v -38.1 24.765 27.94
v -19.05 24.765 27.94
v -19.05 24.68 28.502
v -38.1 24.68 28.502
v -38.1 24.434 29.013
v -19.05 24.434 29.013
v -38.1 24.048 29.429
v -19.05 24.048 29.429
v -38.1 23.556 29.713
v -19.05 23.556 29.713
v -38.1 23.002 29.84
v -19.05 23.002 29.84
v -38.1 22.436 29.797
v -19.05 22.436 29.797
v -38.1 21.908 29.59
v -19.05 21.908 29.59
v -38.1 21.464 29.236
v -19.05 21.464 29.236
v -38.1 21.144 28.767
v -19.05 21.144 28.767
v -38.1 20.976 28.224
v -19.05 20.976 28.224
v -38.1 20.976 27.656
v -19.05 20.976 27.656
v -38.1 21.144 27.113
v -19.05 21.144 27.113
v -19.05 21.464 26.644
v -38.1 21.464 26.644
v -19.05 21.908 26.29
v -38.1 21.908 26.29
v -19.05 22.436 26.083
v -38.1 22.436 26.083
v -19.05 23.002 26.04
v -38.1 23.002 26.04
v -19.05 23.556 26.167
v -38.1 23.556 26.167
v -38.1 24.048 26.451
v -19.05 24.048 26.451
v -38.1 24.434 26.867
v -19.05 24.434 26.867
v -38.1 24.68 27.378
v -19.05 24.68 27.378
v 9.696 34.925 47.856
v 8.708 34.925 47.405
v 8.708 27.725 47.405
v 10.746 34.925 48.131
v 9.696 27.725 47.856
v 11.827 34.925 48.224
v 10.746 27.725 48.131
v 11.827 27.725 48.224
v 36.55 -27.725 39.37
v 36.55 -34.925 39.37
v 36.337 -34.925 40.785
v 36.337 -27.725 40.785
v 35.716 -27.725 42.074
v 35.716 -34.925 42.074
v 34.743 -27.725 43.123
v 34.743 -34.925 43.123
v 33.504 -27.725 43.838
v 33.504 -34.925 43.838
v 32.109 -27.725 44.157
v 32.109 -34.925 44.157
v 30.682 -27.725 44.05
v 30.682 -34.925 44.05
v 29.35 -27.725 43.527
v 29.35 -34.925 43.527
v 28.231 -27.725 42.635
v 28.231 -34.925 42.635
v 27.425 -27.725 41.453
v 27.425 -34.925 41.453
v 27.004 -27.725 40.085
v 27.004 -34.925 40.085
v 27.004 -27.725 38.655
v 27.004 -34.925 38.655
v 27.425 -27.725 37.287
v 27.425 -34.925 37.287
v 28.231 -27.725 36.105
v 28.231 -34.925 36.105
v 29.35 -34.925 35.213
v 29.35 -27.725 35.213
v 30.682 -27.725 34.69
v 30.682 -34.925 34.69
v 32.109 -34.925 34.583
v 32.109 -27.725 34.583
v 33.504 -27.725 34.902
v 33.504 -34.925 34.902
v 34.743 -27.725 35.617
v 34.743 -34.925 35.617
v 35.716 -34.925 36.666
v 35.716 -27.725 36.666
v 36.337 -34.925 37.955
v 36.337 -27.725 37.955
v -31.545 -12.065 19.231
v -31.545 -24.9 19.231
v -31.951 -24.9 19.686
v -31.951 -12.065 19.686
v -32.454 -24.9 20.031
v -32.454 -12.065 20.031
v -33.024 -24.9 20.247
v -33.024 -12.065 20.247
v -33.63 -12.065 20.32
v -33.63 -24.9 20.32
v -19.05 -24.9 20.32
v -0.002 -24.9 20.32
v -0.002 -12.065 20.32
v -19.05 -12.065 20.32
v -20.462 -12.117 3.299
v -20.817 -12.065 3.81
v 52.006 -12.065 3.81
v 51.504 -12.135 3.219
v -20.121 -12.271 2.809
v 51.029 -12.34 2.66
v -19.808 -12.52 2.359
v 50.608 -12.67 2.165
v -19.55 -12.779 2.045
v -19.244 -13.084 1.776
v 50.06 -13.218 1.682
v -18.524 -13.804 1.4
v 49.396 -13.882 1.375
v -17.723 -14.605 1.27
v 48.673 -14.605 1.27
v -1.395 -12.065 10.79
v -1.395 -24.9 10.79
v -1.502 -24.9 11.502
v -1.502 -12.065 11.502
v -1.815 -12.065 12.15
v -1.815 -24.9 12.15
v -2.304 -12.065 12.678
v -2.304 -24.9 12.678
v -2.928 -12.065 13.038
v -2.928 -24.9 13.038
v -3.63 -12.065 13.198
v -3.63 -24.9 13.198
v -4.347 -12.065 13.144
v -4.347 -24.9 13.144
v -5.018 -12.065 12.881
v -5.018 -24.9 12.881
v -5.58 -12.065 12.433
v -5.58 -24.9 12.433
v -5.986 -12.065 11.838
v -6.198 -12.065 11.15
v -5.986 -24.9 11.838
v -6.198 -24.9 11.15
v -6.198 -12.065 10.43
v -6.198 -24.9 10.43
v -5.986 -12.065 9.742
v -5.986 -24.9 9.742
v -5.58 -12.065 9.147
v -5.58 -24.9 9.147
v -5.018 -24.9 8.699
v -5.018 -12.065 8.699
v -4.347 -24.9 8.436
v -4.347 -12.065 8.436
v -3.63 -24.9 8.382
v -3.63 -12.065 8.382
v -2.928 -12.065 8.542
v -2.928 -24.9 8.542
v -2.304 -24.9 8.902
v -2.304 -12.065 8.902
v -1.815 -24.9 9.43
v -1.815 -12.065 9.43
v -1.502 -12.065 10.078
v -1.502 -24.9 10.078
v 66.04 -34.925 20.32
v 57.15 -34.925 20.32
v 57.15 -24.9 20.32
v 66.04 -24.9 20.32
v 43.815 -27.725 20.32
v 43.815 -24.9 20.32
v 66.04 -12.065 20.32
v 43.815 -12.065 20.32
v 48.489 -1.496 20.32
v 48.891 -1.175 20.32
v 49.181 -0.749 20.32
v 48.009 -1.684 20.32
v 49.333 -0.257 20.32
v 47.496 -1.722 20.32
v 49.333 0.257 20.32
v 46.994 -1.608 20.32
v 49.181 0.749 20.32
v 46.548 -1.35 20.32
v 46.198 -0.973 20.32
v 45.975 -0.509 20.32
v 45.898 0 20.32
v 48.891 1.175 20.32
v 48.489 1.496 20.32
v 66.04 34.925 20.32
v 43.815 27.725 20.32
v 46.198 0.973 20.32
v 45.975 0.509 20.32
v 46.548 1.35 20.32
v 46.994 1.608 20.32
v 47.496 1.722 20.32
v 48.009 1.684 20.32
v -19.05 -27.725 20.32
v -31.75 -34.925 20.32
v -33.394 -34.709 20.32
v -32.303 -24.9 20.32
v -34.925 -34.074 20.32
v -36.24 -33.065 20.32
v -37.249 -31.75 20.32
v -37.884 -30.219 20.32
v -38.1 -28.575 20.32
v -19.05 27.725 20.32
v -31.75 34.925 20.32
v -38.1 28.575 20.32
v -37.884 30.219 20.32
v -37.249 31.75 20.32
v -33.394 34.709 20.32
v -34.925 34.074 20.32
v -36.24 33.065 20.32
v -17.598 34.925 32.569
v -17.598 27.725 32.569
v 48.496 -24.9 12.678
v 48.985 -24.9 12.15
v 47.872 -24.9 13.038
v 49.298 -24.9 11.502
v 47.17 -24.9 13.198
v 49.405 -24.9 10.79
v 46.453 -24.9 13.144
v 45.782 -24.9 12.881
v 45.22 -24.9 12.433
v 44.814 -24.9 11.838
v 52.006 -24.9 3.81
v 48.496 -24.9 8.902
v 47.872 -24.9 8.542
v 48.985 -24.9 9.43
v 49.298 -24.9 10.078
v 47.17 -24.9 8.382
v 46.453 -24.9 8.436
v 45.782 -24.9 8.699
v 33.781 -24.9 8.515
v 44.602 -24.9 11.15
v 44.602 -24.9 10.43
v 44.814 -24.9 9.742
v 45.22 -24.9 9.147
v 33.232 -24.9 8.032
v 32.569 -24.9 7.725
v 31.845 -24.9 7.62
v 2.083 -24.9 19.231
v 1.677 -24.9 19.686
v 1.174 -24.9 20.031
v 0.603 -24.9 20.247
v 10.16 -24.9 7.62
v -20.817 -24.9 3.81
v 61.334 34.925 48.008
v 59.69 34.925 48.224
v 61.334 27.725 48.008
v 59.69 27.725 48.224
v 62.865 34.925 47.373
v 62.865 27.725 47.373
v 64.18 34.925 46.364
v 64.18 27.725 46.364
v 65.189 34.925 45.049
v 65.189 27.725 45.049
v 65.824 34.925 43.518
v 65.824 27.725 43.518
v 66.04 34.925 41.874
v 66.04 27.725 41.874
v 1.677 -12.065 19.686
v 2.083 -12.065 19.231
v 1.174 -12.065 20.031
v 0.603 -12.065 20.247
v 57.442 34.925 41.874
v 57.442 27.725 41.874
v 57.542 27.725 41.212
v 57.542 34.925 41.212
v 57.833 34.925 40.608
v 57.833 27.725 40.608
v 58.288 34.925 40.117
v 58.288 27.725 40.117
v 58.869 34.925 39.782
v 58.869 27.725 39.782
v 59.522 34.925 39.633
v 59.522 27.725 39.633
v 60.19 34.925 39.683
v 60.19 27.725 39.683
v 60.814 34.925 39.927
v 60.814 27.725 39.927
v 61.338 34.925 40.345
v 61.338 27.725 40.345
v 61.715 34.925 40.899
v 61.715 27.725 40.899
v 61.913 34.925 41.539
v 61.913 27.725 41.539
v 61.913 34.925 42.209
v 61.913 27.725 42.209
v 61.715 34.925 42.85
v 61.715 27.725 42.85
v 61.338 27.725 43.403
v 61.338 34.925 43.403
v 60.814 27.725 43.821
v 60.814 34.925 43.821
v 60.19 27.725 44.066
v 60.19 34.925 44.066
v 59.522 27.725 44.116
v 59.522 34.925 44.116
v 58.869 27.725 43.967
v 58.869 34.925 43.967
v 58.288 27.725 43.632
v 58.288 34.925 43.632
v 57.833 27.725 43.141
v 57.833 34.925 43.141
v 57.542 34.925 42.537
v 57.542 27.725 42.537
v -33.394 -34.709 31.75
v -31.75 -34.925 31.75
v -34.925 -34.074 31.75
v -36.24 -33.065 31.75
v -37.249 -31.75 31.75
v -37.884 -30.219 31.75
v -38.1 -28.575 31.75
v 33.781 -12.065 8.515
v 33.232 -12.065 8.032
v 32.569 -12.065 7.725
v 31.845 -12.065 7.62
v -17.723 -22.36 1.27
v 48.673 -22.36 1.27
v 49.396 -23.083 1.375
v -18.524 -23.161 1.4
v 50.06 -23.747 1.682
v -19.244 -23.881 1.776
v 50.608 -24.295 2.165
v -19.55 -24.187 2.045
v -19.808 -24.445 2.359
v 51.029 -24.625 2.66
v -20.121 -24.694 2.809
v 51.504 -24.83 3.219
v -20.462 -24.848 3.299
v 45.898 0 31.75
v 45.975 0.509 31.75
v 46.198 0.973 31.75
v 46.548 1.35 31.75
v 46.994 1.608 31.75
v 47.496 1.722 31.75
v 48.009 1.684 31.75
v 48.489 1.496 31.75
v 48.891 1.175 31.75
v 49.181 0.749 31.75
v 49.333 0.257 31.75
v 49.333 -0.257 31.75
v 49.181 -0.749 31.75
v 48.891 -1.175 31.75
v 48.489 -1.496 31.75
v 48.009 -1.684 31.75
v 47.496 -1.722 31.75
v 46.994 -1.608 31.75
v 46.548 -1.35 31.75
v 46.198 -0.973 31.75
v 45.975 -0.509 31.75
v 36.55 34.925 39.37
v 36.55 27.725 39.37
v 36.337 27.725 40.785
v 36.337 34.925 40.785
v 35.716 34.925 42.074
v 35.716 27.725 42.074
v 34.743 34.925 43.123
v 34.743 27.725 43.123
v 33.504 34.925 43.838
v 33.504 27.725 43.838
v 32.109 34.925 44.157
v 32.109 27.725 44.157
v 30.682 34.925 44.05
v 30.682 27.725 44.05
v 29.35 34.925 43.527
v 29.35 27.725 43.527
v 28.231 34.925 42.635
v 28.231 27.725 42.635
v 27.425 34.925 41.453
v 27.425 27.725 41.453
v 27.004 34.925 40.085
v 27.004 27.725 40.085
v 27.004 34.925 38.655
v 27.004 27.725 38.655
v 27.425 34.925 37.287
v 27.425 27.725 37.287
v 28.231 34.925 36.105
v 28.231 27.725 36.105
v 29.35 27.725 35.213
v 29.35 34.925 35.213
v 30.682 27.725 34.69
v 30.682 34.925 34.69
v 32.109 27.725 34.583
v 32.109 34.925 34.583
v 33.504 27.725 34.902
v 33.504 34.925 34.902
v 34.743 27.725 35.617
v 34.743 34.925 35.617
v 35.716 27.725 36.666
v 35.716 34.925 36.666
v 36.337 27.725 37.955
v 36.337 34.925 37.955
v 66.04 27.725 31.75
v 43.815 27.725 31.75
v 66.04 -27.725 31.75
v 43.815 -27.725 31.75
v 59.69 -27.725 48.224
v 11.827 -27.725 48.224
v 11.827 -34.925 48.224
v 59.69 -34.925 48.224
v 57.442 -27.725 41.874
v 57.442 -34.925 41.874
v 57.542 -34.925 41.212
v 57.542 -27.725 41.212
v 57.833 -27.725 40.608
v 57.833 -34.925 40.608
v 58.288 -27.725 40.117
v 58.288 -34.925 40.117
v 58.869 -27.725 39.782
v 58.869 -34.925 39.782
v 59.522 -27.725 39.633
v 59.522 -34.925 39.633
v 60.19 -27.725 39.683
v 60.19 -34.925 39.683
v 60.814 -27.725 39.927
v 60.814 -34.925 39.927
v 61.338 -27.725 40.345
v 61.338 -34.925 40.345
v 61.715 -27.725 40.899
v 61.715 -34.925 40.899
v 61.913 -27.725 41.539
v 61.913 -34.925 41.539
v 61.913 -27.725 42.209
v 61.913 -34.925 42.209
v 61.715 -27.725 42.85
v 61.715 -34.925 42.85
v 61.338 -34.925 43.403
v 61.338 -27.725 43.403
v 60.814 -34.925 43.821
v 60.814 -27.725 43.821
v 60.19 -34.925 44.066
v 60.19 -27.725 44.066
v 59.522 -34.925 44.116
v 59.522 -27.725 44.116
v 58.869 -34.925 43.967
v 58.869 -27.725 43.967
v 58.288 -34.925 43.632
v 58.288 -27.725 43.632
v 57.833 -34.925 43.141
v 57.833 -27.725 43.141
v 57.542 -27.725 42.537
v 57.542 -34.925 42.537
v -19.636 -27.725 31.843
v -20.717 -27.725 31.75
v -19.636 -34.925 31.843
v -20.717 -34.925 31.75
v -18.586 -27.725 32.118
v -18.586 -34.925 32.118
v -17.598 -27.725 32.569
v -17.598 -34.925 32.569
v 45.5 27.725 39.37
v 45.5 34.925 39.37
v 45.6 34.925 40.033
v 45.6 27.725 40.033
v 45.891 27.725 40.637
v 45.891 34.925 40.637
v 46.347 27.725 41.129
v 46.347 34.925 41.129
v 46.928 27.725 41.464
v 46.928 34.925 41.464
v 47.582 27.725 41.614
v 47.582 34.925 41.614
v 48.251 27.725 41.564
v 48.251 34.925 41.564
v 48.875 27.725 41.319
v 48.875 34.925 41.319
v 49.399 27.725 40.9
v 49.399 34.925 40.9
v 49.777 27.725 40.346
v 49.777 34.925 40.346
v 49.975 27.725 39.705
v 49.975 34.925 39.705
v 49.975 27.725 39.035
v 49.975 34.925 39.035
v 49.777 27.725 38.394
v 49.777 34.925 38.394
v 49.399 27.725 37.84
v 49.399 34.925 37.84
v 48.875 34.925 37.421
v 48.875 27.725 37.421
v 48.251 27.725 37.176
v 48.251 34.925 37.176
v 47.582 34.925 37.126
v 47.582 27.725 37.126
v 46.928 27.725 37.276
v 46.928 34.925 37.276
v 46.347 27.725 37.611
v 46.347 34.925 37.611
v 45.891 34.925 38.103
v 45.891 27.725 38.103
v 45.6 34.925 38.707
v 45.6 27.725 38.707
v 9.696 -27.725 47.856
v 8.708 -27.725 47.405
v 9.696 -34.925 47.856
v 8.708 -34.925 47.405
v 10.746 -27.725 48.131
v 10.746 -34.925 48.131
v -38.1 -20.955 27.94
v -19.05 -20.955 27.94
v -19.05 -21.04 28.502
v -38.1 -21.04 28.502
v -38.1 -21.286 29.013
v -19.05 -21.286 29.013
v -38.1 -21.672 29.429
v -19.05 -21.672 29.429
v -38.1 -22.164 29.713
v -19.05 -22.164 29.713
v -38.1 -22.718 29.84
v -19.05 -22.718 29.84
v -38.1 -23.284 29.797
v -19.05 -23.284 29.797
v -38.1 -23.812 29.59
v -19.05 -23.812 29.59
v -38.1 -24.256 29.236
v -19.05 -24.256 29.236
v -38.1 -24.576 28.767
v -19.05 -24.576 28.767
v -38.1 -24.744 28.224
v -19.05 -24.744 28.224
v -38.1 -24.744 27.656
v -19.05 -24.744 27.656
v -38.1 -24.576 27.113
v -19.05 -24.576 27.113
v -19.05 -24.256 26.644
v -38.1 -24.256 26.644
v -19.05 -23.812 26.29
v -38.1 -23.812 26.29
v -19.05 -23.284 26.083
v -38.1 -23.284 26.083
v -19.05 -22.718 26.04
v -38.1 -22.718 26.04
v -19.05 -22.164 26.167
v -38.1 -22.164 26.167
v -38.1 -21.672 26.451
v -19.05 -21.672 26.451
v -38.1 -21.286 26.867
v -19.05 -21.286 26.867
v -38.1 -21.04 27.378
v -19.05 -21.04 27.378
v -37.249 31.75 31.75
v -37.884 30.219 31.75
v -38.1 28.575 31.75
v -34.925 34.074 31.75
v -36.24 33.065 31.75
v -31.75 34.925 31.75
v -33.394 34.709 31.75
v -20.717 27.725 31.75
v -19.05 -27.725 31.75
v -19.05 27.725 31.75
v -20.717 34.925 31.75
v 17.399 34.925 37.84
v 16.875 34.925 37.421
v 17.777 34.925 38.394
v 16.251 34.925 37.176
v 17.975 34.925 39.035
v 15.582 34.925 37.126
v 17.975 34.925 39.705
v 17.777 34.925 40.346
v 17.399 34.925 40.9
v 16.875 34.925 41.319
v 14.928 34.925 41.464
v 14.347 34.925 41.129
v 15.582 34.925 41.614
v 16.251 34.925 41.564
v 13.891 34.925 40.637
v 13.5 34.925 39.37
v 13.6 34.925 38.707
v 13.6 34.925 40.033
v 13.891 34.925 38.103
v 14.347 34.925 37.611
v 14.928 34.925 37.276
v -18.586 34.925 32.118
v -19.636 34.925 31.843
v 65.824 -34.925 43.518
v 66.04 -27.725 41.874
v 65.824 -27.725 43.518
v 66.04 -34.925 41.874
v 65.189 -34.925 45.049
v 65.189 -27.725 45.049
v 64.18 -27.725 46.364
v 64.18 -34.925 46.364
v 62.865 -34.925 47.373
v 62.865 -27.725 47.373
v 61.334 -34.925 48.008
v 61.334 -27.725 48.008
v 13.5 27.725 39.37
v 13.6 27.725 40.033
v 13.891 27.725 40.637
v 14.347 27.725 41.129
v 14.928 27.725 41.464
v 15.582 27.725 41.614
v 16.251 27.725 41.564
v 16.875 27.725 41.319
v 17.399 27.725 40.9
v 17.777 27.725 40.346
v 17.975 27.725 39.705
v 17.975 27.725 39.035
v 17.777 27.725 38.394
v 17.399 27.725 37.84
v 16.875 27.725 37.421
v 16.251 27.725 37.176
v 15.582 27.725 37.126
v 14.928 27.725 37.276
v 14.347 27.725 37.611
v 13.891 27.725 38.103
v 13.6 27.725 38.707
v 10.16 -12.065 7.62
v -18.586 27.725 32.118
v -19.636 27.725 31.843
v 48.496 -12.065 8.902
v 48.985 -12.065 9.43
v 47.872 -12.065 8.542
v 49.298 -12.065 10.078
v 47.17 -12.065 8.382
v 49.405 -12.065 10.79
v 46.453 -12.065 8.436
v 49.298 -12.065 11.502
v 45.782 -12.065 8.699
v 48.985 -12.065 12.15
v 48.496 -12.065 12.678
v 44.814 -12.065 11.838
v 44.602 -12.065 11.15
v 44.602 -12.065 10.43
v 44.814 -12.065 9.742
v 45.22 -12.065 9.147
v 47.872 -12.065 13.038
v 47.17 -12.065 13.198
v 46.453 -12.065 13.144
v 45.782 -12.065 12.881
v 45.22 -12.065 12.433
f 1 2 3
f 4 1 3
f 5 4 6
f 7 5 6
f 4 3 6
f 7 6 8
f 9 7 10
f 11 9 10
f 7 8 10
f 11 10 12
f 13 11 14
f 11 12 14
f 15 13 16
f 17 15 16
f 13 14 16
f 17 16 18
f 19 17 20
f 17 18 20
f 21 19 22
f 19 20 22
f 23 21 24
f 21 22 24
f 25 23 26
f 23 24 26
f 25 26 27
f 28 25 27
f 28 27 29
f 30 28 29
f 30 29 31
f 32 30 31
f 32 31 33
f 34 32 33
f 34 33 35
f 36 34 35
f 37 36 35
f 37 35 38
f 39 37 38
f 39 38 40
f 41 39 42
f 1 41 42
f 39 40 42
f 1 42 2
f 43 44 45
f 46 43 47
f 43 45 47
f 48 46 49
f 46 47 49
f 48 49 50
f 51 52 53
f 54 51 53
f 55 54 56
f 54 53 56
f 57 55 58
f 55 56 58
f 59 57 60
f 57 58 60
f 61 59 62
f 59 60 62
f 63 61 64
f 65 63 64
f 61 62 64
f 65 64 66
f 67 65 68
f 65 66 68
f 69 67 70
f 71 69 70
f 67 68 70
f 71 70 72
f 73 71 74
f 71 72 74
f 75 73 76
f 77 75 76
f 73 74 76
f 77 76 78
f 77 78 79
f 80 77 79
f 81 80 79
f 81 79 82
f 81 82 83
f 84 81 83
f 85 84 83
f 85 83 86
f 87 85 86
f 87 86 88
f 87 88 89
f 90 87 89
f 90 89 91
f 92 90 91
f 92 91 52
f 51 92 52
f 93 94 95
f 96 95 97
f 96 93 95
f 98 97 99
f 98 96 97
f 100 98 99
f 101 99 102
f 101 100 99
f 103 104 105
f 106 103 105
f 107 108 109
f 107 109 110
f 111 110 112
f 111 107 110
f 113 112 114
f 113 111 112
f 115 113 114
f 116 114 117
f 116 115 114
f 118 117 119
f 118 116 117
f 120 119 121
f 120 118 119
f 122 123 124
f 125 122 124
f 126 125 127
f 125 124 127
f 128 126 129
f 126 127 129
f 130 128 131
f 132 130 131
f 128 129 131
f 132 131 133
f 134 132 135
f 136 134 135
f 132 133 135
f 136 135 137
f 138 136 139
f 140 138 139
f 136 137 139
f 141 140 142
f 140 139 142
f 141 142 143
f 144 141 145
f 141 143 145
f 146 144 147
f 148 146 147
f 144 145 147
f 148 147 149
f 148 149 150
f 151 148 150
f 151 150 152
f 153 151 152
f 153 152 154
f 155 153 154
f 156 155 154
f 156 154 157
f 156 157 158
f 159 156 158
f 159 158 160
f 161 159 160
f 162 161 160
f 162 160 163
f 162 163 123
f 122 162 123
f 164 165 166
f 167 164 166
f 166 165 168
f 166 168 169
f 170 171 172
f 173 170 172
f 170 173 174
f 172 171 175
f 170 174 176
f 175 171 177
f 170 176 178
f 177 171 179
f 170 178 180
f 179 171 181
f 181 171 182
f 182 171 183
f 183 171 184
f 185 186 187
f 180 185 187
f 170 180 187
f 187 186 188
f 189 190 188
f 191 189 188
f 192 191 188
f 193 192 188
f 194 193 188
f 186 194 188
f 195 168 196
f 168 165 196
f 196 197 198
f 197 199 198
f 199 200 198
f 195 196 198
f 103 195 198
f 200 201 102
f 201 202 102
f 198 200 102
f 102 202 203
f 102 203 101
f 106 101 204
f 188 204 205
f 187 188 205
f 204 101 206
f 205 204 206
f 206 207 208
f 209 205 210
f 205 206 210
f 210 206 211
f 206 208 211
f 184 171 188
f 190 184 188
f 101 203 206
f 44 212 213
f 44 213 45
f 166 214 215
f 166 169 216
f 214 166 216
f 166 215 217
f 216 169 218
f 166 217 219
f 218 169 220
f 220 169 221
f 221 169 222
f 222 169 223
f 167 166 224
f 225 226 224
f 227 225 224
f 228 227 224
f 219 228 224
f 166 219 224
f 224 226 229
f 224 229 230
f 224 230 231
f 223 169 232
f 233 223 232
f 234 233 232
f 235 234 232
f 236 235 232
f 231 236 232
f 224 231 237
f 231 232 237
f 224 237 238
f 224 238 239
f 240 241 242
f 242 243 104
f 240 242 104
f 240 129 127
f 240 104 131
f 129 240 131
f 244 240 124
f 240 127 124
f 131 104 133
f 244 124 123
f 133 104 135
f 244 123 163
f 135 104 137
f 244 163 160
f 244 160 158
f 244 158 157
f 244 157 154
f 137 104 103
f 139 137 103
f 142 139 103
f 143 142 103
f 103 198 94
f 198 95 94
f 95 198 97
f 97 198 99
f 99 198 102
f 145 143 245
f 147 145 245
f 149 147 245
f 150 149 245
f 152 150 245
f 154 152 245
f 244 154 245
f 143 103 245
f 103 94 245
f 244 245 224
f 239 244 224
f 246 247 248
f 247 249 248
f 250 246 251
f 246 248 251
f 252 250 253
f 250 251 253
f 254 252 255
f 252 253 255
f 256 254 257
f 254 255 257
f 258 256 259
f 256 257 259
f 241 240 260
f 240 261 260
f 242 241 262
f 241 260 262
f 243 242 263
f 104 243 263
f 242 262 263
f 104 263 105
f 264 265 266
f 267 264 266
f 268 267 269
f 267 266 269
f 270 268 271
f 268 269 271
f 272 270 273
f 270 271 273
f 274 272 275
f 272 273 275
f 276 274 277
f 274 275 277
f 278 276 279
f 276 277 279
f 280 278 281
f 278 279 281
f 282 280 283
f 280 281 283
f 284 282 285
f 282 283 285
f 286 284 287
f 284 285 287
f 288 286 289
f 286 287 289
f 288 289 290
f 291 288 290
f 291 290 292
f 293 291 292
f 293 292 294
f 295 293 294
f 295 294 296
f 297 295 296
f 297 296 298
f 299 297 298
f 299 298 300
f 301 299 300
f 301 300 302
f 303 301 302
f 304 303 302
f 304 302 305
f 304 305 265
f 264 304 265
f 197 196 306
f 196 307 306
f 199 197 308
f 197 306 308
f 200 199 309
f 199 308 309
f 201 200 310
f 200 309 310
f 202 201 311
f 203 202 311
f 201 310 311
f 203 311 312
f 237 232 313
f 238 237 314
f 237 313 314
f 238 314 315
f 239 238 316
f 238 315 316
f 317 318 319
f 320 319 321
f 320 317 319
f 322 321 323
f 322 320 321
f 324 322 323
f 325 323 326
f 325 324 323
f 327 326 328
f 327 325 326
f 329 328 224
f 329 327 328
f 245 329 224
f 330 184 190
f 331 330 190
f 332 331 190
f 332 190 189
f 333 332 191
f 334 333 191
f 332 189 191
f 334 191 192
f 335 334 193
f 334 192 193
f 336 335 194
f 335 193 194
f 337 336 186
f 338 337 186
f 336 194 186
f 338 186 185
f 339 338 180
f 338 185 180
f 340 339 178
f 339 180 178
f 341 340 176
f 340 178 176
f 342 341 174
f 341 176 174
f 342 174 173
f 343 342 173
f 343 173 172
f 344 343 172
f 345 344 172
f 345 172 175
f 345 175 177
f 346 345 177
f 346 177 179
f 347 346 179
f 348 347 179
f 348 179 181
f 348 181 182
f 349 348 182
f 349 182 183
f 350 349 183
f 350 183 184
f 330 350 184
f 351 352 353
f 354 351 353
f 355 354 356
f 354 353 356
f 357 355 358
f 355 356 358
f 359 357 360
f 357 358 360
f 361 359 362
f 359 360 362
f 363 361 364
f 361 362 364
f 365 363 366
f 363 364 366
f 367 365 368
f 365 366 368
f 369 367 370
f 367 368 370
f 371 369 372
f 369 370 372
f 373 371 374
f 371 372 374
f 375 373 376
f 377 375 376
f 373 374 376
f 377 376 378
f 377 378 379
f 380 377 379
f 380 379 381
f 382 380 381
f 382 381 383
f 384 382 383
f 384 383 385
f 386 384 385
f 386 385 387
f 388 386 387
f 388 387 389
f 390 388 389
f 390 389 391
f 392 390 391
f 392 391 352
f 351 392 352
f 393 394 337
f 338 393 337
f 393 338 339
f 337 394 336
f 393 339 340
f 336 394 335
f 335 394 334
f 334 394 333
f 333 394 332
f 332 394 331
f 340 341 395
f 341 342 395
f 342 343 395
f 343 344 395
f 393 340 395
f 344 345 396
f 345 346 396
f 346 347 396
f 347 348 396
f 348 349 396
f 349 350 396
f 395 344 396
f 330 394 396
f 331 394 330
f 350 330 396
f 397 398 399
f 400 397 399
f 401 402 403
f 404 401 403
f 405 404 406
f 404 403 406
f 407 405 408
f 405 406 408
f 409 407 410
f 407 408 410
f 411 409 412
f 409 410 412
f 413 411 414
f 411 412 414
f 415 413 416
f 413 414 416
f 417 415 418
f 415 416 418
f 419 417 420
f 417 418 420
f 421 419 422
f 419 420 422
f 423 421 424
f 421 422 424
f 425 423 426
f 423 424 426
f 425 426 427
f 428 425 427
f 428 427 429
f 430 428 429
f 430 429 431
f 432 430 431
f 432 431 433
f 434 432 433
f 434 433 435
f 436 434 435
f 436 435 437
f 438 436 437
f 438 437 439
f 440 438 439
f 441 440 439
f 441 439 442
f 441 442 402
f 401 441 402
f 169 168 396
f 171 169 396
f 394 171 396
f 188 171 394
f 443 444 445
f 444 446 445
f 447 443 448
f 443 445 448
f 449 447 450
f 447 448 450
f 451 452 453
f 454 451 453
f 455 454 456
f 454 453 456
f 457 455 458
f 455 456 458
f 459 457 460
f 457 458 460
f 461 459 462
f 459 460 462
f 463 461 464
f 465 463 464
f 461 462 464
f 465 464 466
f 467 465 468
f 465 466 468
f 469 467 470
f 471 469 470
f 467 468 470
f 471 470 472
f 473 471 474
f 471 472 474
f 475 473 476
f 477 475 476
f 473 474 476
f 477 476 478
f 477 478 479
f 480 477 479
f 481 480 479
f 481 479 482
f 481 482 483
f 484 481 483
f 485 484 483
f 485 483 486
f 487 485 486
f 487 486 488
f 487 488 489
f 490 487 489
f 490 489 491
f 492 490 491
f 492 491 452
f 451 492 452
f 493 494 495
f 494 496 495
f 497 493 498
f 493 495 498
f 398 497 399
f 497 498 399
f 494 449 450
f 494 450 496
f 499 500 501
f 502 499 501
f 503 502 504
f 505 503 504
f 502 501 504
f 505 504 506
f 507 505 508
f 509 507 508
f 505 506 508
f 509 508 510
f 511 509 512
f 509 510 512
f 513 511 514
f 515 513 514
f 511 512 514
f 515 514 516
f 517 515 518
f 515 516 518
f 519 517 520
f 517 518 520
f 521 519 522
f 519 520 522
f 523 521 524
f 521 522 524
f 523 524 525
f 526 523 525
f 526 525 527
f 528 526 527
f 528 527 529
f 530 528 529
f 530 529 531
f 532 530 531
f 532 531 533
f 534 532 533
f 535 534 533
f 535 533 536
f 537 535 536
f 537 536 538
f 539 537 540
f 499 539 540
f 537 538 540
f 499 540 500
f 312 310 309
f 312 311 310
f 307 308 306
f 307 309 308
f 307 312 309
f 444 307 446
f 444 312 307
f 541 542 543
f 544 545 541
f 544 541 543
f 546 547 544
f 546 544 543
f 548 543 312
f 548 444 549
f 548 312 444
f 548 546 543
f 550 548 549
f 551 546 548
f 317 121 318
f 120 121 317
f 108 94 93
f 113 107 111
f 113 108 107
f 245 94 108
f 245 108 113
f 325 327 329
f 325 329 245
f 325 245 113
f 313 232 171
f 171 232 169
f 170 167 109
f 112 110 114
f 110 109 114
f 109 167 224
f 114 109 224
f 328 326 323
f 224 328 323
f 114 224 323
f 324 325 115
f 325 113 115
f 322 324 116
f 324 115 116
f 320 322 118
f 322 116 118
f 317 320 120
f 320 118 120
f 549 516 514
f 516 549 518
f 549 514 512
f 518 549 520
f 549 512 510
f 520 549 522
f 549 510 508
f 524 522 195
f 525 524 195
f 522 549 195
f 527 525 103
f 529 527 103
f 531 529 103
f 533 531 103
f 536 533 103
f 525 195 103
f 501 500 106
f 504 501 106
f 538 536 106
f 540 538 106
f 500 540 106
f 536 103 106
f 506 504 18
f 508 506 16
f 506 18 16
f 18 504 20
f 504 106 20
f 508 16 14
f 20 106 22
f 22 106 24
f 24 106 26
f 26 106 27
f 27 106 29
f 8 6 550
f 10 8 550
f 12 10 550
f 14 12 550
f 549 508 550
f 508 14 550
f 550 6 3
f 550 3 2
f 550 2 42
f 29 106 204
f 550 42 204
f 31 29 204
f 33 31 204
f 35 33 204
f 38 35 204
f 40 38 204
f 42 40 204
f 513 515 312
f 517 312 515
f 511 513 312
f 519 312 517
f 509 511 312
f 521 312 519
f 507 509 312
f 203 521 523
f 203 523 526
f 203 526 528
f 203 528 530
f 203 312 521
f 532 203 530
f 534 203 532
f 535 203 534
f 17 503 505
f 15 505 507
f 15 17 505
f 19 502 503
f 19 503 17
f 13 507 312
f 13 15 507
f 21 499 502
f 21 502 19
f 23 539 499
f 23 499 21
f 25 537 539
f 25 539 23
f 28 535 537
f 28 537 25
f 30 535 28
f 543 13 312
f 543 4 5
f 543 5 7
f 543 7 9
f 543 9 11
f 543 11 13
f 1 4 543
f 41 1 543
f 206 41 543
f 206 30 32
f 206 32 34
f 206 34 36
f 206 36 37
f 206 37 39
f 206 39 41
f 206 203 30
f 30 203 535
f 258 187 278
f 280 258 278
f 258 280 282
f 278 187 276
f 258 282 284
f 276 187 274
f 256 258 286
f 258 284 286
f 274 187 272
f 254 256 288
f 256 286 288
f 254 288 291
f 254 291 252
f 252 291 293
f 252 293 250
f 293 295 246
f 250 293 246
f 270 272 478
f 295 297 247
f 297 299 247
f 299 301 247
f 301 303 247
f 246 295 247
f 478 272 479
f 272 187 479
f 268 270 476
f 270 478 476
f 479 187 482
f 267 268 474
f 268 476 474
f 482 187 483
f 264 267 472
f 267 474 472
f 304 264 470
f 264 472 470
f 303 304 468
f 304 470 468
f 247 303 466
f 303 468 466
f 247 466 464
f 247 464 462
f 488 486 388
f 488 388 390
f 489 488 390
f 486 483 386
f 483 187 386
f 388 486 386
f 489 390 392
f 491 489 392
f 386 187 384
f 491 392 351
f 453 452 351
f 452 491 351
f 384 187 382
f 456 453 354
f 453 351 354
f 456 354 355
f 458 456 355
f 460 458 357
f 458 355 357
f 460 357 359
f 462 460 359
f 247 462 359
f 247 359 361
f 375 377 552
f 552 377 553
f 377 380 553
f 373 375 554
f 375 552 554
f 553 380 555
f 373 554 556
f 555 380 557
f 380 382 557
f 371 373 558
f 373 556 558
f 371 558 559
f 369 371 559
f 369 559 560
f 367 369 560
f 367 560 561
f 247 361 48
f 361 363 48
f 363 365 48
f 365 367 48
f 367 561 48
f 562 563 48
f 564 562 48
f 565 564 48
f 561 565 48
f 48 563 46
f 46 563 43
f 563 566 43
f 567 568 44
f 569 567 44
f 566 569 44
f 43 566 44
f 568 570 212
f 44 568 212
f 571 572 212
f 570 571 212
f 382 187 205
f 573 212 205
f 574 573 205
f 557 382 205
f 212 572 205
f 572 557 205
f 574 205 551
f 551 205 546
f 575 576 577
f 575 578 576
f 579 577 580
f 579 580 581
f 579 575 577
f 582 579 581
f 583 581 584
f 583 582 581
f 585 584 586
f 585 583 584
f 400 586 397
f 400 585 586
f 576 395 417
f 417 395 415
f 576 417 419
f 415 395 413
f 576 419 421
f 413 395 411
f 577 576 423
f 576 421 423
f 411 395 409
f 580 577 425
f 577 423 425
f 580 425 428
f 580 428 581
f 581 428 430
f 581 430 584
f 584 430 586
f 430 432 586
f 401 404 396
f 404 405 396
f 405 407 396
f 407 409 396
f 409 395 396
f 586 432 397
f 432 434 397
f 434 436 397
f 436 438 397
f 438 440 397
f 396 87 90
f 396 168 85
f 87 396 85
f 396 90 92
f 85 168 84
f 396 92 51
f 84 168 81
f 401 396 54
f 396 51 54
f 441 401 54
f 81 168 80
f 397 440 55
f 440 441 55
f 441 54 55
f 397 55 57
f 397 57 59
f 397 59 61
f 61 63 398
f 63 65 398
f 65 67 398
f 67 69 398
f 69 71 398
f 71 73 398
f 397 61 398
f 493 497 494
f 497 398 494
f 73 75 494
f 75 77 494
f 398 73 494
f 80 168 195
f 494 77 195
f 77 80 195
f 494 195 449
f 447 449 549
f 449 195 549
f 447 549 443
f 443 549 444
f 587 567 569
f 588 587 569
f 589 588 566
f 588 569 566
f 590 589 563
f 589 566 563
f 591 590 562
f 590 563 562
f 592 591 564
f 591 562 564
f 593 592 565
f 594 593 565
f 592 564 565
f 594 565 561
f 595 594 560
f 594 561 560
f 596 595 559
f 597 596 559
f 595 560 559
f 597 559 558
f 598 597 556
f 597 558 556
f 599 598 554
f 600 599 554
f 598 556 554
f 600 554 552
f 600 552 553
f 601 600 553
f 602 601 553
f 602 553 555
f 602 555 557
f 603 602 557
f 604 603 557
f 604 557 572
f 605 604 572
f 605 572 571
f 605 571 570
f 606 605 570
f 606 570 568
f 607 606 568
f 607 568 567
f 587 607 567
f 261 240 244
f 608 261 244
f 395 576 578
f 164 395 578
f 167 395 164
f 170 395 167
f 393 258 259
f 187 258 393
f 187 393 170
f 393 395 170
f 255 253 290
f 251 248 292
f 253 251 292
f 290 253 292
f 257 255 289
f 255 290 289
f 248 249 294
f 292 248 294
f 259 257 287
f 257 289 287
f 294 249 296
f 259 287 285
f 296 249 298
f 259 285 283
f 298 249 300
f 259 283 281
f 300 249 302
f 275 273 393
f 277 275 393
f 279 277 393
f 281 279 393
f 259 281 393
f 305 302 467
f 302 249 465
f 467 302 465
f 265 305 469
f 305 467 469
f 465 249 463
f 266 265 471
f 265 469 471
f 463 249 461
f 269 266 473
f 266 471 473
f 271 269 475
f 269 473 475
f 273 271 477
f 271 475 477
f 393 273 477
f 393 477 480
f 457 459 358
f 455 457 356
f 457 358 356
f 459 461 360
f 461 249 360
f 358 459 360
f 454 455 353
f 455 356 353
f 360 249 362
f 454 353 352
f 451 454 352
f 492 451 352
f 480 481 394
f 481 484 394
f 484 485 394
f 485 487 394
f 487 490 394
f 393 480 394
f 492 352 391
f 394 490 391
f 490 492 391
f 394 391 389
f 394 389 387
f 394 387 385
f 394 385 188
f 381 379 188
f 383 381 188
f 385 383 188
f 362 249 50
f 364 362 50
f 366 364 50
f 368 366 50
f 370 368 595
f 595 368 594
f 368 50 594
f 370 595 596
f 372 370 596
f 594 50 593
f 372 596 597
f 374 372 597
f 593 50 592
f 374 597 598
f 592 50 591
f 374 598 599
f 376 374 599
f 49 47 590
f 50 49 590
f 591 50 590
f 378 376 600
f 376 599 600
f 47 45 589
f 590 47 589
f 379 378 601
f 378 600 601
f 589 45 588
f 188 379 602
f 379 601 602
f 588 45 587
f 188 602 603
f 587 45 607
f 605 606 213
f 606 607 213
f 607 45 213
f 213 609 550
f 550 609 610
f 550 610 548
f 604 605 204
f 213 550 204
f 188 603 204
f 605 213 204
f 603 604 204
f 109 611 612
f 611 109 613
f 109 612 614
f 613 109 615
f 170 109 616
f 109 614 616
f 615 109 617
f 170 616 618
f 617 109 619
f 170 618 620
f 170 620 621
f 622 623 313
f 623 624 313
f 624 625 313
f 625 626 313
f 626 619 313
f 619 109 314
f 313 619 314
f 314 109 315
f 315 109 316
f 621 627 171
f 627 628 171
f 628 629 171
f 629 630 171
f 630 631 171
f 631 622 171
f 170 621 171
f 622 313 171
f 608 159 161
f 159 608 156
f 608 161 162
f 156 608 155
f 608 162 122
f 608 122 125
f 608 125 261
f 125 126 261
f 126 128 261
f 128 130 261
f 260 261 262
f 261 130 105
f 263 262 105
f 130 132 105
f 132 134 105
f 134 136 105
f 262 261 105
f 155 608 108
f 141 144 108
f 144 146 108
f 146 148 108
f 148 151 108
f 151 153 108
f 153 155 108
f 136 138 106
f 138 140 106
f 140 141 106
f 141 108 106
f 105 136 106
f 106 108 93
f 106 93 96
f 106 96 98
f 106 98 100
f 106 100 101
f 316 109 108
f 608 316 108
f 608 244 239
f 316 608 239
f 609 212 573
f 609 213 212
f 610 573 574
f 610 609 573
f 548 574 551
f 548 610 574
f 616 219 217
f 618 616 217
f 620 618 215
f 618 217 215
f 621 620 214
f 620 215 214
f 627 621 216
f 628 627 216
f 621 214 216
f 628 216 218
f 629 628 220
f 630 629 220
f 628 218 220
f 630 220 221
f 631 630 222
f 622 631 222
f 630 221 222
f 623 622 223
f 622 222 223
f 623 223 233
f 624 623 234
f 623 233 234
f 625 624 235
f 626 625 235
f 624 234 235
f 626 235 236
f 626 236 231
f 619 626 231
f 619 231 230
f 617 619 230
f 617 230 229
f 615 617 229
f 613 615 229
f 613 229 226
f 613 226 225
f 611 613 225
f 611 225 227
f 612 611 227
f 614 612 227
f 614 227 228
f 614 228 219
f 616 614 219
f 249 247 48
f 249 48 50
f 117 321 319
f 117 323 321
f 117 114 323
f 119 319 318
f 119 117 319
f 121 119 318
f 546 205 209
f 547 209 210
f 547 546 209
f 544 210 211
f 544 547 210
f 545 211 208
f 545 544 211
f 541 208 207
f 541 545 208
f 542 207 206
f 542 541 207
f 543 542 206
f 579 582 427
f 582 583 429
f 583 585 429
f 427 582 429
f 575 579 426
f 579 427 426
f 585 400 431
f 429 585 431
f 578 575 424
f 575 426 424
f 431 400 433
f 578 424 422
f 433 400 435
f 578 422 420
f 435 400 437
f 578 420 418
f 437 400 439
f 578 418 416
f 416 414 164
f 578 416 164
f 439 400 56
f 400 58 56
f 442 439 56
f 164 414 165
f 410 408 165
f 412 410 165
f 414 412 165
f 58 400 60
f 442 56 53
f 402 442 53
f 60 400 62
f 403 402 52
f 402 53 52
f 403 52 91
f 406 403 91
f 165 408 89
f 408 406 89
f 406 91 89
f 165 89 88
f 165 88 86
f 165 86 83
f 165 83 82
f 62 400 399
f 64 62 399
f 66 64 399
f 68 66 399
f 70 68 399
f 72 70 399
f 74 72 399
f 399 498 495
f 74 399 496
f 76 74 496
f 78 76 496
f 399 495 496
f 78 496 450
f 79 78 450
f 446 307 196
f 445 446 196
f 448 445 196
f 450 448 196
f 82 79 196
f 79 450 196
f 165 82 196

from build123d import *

# Parameters (mm, degrees)
SKETCH1_W               = 114.3
SKETCH1_H               = 69.85
BOSS_EXTRUDE1_DEPTH     = 57.15
SKETCH2_W               = 114.3
SKETCH2_H               = 55.450000124
CUT_EXTRUDE2_DEPTH      = 25.4
SKETCH3_W               = 114.3
SKETCH3_H               = 46.99
CUT_EXTRUDE3_DEPTH      = 20.32
CUT_EXTRUDE6_REACH      = 108.824
SKETCH7_R               = 4.8
CUT_EXTRUDE7_DEPTH      = 75.121121315
CUT_EXTRUDE7_DEPTH_BACK = 75.121121315
SKETCH9_W               = 62.865
SKETCH9_H               = 55.450000124
SKETCH9_W_2             = 19.05
SKETCH9_H_2             = 69.85
CUT_EXTRUDE8_REACH      = 108.824
SKETCH8_R               = 2.25
SKETCH12_R              = 1.905
CUT_EXTRUDE10_DEPTH     = 19.05
SKETCH13_W              = 95.25
SKETCH13_H              = 8.925763794
CUT_EXTRUDE12_DEPTH     = 107.823534392
BOSS_EXTRUDE2_REACH     = 103.269
SKETCH14_W              = 20.32
SKETCH14_H              = 15.660000062
SKETCH5_R               = 2.415
CUT_EXTRUDE20_DEPTH     = 103.326545714
SKETCH18_W              = 20.32
SKETCH18_H              = 10.024904341
CUT_EXTRUDE21_DEPTH     = 113.329404355
BOSS_EXTRUDE4_DEPTH     = 8.89
F_8_CLEARANCE_HOLE1_D   = 4.4958
F_8_32_TAPPED_HOLE1_D   = 3.4544
SKETCH40_W              = 104.14
SKETCH40_H              = 12.835095659
CUT_EXTRUDE22_DEPTH     = 1.27
CUT_EXTRUDE24_DEPTH     = 108.544786288
FILLET3_R               = 6.35
CUT_EXTRUDE25_DEPTH     = 102.320780831
FILLET4_R               = 2.54


with BuildPart() as part:
    # Sketch1 → Boss-Extrude1 (new body)
    with BuildSketch(Plane.XY):
        Rectangle(SKETCH1_W, SKETCH1_H)
    extrude(amount=BOSS_EXTRUDE1_DEPTH)

    # Sketch2 → Cut-Extrude2 (cut)
    with BuildSketch(Plane.XY.offset(57.15)):
        Rectangle(SKETCH2_W, SKETCH2_H)
    extrude(amount=-CUT_EXTRUDE2_DEPTH, mode=Mode.SUBTRACT)

    # Sketch3 → Cut-Extrude3 (cut)
    with BuildSketch(Plane(origin=(0, 0, 0), x_dir=(-1, 0, 0), z_dir=(0, 0, -1))):
        with Locations((0, 11.43)):
            Rectangle(SKETCH3_W, SKETCH3_H)
    extrude(amount=-CUT_EXTRUDE3_DEPTH, mode=Mode.SUBTRACT)

    # Cut-Extrude6: up to this face of the body (flat: up to its plane)
    cut_extrude6_end = Plane(part.part.faces().sort_by_distance((0, 34.925, 38.735))[0])
    # Sketch7 → Cut-Extrude6 (cut, up to the picked face)
    with BuildSketch(Plane.XZ.offset(34.925), mode=Mode.PRIVATE) as cut_extrude6_sk1:
        with Locations((31.75, 39.37)):
            Circle(SKETCH7_R)
    cut_extrude6_tool1 = split(extrude(cut_extrude6_sk1.sketch, amount=-CUT_EXTRUDE6_REACH, mode=Mode.PRIVATE), bisect_by=cut_extrude6_end, keep=Keep.BOTH, mode=Mode.PRIVATE)
    add(cut_extrude6_tool1.solids().sort_by(Axis((31.75, -34.925, 39.37), (0, 1, 0)))[0], mode=Mode.SUBTRACT)

    # Sketch9 → Cut-Extrude7 (cut, two sides: drawn at the far end of the back side and taken through both)
    with BuildSketch(Plane.XY.offset(31.75).offset(-CUT_EXTRUDE7_DEPTH_BACK)):
        with Locations((12.3825, 0)):
            Rectangle(SKETCH9_W, SKETCH9_H)
        with Locations((-47.625, 0)):
            Rectangle(SKETCH9_W_2, SKETCH9_H_2)
    extrude(amount=CUT_EXTRUDE7_DEPTH + CUT_EXTRUDE7_DEPTH_BACK, mode=Mode.SUBTRACT)

    # Sketch8 → Cut-Extrude8 (cut, up to next)
    with BuildSketch(Plane(origin=(0, 34.925, 0), x_dir=(1, 0, 0), z_dir=(0, 1, 0)), mode=Mode.PRIVATE) as cut_extrude8_sk1:
        with Locations(Location((15.75, -39.37, 0), (0, 0, 180))):
            Circle(SKETCH8_R)
    cut_extrude8_tool1 = extrude(cut_extrude8_sk1.sketch, amount=-CUT_EXTRUDE8_REACH, mode=Mode.PRIVATE) & part.part
    # Sketch8 → Cut-Extrude8 (cut, up to next)
    with BuildSketch(Plane(origin=(0, 34.925, 0), x_dir=(1, 0, 0), z_dir=(0, 1, 0)), mode=Mode.PRIVATE) as cut_extrude8_sk2:
        with Locations(Location((47.75, -39.37, 0), (0, 0, 180))):
            Circle(SKETCH8_R)
    cut_extrude8_tool2 = extrude(cut_extrude8_sk2.sketch, amount=-CUT_EXTRUDE8_REACH, mode=Mode.PRIVATE) & part.part
    add(cut_extrude8_tool1.solids().sort_by_distance((15.75, 34.925, 39.37))[0], mode=Mode.SUBTRACT)
    add(cut_extrude8_tool2.solids().sort_by_distance((47.75, 34.925, 39.37))[0], mode=Mode.SUBTRACT)

    # Sketch12 → Cut-Extrude10 (cut)
    with BuildSketch(Plane(origin=(-19.05, 0, 0), x_dir=(0, 0, -1), z_dir=(1, 0, 0))):
        with Locations(Location((-27.94, -22.86, 0), (0, 0, 90))):
            Circle(SKETCH12_R)
        with Locations(Location((-27.94, 22.86, 0), (0, 0, 90))):
            Circle(SKETCH12_R)
    extrude(amount=-CUT_EXTRUDE10_DEPTH, mode=Mode.SUBTRACT)

    # Sketch13 → Cut-Extrude12 (cut, through all)
    with BuildSketch(Plane(origin=(0, 34.925, 0), x_dir=(1, 0, 0), z_dir=(0, 1, 0))):
        with Locations((9.525, -52.687118103)):
            Rectangle(SKETCH13_W, SKETCH13_H)
    extrude(amount=-CUT_EXTRUDE12_DEPTH, mode=Mode.SUBTRACT)

    # Sketch14 → Boss-Extrude2 (add, up to next)
    with BuildSketch(Plane.ZY.offset(-43.815), mode=Mode.PRIVATE) as boss_extrude2_sk1:
        with Locations((10.16, -19.895000031)):
            Rectangle(SKETCH14_W, SKETCH14_H)
    boss_extrude2_tool1 = extrude(boss_extrude2_sk1.sketch, amount=BOSS_EXTRUDE2_REACH, mode=Mode.PRIVATE) - part.part
    add(boss_extrude2_tool1.solids().sort_by_distance((43.815, -19.895, 10.16))[0])

    # Sketch5 → Cut-Extrude20 (cut, through all)
    with BuildSketch(Plane.XZ.offset(34.925)):
        with Locations((-3.81, 10.79)):
            Circle(SKETCH5_R)
        with Locations((46.99, 10.79)):
            Circle(SKETCH5_R)
    extrude(amount=-CUT_EXTRUDE20_DEPTH, mode=Mode.SUBTRACT)

    # Sketch18 → Cut-Extrude21 (cut, through all)
    with BuildSketch(Plane.ZY.offset(38.1)):
        with Locations((10.16, -29.91254783)):
            Rectangle(SKETCH18_W, SKETCH18_H)
    extrude(amount=-CUT_EXTRUDE21_DEPTH, mode=Mode.SUBTRACT)

    # Sketch26 → Boss-Extrude4 (add)
    with BuildSketch(Plane(origin=(57.15, 0, 0), x_dir=(0, 0, -1), z_dir=(1, 0, 0))):
        Polygon((-48.224236206, -34.925), (-20.32, -34.925), (-20.32, -24.900095659), (0, -24.900095659), (0, -12.065), (-20.32, -12.065), (-20.32, 34.925), (-48.224236206, 34.925), (-48.224236206, 27.725000062), (-31.75, 27.725000062), (-31.75, -27.725000062), (-48.224236206, -27.725000062), align=None)
    extrude(amount=BOSS_EXTRUDE4_DEPTH)

    # #8 Clearance Hole1 (through all)
    with Locations(Plane(origin=(0, 34.925, 0), x_dir=(1, 0, 0), z_dir=(0, 1, 0))):
        with Locations((59.69, -41.874236206)):
            Hole(F_8_CLEARANCE_HOLE1_D / 2)

    # #8-32 Tapped Hole1 (through all)
    with Locations(Plane.XY.offset(31.75)):
        with Locations((47.625, 0)):
            Hole(F_8_32_TAPPED_HOLE1_D / 2)

    # Sketch40 → Cut-Extrude22 (cut)
    with BuildSketch(Plane(origin=(0, 0, 0), x_dir=(-1, 0, 0), z_dir=(0, 0, -1))):
        with Locations((-13.97, -18.482547829)):
            Rectangle(SKETCH40_W, SKETCH40_H)
    extrude(amount=-CUT_EXTRUDE22_DEPTH, mode=Mode.SUBTRACT)

    # Sketch47 → Cut-Extrude24 (cut, through all)
    with BuildSketch(Plane(origin=(0, 34.925, 0), x_dir=(1, 0, 0), z_dir=(0, 1, 0))):
        Polygon((-38.1, -31.75), (-19.05, -31.75), (10.16, -48.224236206), (-38.1, -48.224236206), align=None)
    extrude(amount=-CUT_EXTRUDE24_DEPTH, mode=Mode.SUBTRACT)

    # Fillet3
    fillet3_edges = [part.edges().sort_by_distance(p)[0] for p in [
        (-38.1, -34.925, 26.035),
        (66.04, -31.325000031, 48.224236206),
        (66.04, 31.325000031, 48.224236206),
        (10.16, -31.325000031, 48.224236206),
        (10.16, 31.325000031, 48.224236206),
        (-19.05, -31.325000031, 31.75),
        (-19.05, 31.325000031, 31.75),
        (-38.1, 34.925, 26.035),
    ]]
    fillet(fillet3_edges, radius=FILLET3_R)

    # Sketch49 → Cut-Extrude25 (cut, through all)
    with BuildSketch(Plane.XZ.offset(24.900095659)):
        Polygon((-38.1, 20.32), (-32.302770819, 20.32), (-19.050248439, 1.27), (-38.1, 1.27), align=None)
        Polygon((1.32498508, 20.32), (10.16, 7.62), (33.02, 7.62), (43.815, 20.32), align=None)
        Polygon((66.04, 20.32), (49.8475, 1.27), (66.04, 1.27), align=None)
    extrude(amount=-CUT_EXTRUDE25_DEPTH, mode=Mode.SUBTRACT)

    # Fillet4
    fillet4_edges = [part.edges().sort_by_distance(p)[0] for p in [
        (15.398625781, -24.900095659, 1.27),
        (15.398625781, -12.065, 1.27),
        (49.8475, -18.48254783, 1.27),
        (1.32498508, -18.48254783, 20.32),
        (-19.050248439, -18.48254783, 1.27),
        (-32.302770819, -18.48254783, 20.32),
        (33.02, -18.48254783, 7.62),
    ]]
    fillet(fillet4_edges, radius=FILLET4_R)


solid = part.part
